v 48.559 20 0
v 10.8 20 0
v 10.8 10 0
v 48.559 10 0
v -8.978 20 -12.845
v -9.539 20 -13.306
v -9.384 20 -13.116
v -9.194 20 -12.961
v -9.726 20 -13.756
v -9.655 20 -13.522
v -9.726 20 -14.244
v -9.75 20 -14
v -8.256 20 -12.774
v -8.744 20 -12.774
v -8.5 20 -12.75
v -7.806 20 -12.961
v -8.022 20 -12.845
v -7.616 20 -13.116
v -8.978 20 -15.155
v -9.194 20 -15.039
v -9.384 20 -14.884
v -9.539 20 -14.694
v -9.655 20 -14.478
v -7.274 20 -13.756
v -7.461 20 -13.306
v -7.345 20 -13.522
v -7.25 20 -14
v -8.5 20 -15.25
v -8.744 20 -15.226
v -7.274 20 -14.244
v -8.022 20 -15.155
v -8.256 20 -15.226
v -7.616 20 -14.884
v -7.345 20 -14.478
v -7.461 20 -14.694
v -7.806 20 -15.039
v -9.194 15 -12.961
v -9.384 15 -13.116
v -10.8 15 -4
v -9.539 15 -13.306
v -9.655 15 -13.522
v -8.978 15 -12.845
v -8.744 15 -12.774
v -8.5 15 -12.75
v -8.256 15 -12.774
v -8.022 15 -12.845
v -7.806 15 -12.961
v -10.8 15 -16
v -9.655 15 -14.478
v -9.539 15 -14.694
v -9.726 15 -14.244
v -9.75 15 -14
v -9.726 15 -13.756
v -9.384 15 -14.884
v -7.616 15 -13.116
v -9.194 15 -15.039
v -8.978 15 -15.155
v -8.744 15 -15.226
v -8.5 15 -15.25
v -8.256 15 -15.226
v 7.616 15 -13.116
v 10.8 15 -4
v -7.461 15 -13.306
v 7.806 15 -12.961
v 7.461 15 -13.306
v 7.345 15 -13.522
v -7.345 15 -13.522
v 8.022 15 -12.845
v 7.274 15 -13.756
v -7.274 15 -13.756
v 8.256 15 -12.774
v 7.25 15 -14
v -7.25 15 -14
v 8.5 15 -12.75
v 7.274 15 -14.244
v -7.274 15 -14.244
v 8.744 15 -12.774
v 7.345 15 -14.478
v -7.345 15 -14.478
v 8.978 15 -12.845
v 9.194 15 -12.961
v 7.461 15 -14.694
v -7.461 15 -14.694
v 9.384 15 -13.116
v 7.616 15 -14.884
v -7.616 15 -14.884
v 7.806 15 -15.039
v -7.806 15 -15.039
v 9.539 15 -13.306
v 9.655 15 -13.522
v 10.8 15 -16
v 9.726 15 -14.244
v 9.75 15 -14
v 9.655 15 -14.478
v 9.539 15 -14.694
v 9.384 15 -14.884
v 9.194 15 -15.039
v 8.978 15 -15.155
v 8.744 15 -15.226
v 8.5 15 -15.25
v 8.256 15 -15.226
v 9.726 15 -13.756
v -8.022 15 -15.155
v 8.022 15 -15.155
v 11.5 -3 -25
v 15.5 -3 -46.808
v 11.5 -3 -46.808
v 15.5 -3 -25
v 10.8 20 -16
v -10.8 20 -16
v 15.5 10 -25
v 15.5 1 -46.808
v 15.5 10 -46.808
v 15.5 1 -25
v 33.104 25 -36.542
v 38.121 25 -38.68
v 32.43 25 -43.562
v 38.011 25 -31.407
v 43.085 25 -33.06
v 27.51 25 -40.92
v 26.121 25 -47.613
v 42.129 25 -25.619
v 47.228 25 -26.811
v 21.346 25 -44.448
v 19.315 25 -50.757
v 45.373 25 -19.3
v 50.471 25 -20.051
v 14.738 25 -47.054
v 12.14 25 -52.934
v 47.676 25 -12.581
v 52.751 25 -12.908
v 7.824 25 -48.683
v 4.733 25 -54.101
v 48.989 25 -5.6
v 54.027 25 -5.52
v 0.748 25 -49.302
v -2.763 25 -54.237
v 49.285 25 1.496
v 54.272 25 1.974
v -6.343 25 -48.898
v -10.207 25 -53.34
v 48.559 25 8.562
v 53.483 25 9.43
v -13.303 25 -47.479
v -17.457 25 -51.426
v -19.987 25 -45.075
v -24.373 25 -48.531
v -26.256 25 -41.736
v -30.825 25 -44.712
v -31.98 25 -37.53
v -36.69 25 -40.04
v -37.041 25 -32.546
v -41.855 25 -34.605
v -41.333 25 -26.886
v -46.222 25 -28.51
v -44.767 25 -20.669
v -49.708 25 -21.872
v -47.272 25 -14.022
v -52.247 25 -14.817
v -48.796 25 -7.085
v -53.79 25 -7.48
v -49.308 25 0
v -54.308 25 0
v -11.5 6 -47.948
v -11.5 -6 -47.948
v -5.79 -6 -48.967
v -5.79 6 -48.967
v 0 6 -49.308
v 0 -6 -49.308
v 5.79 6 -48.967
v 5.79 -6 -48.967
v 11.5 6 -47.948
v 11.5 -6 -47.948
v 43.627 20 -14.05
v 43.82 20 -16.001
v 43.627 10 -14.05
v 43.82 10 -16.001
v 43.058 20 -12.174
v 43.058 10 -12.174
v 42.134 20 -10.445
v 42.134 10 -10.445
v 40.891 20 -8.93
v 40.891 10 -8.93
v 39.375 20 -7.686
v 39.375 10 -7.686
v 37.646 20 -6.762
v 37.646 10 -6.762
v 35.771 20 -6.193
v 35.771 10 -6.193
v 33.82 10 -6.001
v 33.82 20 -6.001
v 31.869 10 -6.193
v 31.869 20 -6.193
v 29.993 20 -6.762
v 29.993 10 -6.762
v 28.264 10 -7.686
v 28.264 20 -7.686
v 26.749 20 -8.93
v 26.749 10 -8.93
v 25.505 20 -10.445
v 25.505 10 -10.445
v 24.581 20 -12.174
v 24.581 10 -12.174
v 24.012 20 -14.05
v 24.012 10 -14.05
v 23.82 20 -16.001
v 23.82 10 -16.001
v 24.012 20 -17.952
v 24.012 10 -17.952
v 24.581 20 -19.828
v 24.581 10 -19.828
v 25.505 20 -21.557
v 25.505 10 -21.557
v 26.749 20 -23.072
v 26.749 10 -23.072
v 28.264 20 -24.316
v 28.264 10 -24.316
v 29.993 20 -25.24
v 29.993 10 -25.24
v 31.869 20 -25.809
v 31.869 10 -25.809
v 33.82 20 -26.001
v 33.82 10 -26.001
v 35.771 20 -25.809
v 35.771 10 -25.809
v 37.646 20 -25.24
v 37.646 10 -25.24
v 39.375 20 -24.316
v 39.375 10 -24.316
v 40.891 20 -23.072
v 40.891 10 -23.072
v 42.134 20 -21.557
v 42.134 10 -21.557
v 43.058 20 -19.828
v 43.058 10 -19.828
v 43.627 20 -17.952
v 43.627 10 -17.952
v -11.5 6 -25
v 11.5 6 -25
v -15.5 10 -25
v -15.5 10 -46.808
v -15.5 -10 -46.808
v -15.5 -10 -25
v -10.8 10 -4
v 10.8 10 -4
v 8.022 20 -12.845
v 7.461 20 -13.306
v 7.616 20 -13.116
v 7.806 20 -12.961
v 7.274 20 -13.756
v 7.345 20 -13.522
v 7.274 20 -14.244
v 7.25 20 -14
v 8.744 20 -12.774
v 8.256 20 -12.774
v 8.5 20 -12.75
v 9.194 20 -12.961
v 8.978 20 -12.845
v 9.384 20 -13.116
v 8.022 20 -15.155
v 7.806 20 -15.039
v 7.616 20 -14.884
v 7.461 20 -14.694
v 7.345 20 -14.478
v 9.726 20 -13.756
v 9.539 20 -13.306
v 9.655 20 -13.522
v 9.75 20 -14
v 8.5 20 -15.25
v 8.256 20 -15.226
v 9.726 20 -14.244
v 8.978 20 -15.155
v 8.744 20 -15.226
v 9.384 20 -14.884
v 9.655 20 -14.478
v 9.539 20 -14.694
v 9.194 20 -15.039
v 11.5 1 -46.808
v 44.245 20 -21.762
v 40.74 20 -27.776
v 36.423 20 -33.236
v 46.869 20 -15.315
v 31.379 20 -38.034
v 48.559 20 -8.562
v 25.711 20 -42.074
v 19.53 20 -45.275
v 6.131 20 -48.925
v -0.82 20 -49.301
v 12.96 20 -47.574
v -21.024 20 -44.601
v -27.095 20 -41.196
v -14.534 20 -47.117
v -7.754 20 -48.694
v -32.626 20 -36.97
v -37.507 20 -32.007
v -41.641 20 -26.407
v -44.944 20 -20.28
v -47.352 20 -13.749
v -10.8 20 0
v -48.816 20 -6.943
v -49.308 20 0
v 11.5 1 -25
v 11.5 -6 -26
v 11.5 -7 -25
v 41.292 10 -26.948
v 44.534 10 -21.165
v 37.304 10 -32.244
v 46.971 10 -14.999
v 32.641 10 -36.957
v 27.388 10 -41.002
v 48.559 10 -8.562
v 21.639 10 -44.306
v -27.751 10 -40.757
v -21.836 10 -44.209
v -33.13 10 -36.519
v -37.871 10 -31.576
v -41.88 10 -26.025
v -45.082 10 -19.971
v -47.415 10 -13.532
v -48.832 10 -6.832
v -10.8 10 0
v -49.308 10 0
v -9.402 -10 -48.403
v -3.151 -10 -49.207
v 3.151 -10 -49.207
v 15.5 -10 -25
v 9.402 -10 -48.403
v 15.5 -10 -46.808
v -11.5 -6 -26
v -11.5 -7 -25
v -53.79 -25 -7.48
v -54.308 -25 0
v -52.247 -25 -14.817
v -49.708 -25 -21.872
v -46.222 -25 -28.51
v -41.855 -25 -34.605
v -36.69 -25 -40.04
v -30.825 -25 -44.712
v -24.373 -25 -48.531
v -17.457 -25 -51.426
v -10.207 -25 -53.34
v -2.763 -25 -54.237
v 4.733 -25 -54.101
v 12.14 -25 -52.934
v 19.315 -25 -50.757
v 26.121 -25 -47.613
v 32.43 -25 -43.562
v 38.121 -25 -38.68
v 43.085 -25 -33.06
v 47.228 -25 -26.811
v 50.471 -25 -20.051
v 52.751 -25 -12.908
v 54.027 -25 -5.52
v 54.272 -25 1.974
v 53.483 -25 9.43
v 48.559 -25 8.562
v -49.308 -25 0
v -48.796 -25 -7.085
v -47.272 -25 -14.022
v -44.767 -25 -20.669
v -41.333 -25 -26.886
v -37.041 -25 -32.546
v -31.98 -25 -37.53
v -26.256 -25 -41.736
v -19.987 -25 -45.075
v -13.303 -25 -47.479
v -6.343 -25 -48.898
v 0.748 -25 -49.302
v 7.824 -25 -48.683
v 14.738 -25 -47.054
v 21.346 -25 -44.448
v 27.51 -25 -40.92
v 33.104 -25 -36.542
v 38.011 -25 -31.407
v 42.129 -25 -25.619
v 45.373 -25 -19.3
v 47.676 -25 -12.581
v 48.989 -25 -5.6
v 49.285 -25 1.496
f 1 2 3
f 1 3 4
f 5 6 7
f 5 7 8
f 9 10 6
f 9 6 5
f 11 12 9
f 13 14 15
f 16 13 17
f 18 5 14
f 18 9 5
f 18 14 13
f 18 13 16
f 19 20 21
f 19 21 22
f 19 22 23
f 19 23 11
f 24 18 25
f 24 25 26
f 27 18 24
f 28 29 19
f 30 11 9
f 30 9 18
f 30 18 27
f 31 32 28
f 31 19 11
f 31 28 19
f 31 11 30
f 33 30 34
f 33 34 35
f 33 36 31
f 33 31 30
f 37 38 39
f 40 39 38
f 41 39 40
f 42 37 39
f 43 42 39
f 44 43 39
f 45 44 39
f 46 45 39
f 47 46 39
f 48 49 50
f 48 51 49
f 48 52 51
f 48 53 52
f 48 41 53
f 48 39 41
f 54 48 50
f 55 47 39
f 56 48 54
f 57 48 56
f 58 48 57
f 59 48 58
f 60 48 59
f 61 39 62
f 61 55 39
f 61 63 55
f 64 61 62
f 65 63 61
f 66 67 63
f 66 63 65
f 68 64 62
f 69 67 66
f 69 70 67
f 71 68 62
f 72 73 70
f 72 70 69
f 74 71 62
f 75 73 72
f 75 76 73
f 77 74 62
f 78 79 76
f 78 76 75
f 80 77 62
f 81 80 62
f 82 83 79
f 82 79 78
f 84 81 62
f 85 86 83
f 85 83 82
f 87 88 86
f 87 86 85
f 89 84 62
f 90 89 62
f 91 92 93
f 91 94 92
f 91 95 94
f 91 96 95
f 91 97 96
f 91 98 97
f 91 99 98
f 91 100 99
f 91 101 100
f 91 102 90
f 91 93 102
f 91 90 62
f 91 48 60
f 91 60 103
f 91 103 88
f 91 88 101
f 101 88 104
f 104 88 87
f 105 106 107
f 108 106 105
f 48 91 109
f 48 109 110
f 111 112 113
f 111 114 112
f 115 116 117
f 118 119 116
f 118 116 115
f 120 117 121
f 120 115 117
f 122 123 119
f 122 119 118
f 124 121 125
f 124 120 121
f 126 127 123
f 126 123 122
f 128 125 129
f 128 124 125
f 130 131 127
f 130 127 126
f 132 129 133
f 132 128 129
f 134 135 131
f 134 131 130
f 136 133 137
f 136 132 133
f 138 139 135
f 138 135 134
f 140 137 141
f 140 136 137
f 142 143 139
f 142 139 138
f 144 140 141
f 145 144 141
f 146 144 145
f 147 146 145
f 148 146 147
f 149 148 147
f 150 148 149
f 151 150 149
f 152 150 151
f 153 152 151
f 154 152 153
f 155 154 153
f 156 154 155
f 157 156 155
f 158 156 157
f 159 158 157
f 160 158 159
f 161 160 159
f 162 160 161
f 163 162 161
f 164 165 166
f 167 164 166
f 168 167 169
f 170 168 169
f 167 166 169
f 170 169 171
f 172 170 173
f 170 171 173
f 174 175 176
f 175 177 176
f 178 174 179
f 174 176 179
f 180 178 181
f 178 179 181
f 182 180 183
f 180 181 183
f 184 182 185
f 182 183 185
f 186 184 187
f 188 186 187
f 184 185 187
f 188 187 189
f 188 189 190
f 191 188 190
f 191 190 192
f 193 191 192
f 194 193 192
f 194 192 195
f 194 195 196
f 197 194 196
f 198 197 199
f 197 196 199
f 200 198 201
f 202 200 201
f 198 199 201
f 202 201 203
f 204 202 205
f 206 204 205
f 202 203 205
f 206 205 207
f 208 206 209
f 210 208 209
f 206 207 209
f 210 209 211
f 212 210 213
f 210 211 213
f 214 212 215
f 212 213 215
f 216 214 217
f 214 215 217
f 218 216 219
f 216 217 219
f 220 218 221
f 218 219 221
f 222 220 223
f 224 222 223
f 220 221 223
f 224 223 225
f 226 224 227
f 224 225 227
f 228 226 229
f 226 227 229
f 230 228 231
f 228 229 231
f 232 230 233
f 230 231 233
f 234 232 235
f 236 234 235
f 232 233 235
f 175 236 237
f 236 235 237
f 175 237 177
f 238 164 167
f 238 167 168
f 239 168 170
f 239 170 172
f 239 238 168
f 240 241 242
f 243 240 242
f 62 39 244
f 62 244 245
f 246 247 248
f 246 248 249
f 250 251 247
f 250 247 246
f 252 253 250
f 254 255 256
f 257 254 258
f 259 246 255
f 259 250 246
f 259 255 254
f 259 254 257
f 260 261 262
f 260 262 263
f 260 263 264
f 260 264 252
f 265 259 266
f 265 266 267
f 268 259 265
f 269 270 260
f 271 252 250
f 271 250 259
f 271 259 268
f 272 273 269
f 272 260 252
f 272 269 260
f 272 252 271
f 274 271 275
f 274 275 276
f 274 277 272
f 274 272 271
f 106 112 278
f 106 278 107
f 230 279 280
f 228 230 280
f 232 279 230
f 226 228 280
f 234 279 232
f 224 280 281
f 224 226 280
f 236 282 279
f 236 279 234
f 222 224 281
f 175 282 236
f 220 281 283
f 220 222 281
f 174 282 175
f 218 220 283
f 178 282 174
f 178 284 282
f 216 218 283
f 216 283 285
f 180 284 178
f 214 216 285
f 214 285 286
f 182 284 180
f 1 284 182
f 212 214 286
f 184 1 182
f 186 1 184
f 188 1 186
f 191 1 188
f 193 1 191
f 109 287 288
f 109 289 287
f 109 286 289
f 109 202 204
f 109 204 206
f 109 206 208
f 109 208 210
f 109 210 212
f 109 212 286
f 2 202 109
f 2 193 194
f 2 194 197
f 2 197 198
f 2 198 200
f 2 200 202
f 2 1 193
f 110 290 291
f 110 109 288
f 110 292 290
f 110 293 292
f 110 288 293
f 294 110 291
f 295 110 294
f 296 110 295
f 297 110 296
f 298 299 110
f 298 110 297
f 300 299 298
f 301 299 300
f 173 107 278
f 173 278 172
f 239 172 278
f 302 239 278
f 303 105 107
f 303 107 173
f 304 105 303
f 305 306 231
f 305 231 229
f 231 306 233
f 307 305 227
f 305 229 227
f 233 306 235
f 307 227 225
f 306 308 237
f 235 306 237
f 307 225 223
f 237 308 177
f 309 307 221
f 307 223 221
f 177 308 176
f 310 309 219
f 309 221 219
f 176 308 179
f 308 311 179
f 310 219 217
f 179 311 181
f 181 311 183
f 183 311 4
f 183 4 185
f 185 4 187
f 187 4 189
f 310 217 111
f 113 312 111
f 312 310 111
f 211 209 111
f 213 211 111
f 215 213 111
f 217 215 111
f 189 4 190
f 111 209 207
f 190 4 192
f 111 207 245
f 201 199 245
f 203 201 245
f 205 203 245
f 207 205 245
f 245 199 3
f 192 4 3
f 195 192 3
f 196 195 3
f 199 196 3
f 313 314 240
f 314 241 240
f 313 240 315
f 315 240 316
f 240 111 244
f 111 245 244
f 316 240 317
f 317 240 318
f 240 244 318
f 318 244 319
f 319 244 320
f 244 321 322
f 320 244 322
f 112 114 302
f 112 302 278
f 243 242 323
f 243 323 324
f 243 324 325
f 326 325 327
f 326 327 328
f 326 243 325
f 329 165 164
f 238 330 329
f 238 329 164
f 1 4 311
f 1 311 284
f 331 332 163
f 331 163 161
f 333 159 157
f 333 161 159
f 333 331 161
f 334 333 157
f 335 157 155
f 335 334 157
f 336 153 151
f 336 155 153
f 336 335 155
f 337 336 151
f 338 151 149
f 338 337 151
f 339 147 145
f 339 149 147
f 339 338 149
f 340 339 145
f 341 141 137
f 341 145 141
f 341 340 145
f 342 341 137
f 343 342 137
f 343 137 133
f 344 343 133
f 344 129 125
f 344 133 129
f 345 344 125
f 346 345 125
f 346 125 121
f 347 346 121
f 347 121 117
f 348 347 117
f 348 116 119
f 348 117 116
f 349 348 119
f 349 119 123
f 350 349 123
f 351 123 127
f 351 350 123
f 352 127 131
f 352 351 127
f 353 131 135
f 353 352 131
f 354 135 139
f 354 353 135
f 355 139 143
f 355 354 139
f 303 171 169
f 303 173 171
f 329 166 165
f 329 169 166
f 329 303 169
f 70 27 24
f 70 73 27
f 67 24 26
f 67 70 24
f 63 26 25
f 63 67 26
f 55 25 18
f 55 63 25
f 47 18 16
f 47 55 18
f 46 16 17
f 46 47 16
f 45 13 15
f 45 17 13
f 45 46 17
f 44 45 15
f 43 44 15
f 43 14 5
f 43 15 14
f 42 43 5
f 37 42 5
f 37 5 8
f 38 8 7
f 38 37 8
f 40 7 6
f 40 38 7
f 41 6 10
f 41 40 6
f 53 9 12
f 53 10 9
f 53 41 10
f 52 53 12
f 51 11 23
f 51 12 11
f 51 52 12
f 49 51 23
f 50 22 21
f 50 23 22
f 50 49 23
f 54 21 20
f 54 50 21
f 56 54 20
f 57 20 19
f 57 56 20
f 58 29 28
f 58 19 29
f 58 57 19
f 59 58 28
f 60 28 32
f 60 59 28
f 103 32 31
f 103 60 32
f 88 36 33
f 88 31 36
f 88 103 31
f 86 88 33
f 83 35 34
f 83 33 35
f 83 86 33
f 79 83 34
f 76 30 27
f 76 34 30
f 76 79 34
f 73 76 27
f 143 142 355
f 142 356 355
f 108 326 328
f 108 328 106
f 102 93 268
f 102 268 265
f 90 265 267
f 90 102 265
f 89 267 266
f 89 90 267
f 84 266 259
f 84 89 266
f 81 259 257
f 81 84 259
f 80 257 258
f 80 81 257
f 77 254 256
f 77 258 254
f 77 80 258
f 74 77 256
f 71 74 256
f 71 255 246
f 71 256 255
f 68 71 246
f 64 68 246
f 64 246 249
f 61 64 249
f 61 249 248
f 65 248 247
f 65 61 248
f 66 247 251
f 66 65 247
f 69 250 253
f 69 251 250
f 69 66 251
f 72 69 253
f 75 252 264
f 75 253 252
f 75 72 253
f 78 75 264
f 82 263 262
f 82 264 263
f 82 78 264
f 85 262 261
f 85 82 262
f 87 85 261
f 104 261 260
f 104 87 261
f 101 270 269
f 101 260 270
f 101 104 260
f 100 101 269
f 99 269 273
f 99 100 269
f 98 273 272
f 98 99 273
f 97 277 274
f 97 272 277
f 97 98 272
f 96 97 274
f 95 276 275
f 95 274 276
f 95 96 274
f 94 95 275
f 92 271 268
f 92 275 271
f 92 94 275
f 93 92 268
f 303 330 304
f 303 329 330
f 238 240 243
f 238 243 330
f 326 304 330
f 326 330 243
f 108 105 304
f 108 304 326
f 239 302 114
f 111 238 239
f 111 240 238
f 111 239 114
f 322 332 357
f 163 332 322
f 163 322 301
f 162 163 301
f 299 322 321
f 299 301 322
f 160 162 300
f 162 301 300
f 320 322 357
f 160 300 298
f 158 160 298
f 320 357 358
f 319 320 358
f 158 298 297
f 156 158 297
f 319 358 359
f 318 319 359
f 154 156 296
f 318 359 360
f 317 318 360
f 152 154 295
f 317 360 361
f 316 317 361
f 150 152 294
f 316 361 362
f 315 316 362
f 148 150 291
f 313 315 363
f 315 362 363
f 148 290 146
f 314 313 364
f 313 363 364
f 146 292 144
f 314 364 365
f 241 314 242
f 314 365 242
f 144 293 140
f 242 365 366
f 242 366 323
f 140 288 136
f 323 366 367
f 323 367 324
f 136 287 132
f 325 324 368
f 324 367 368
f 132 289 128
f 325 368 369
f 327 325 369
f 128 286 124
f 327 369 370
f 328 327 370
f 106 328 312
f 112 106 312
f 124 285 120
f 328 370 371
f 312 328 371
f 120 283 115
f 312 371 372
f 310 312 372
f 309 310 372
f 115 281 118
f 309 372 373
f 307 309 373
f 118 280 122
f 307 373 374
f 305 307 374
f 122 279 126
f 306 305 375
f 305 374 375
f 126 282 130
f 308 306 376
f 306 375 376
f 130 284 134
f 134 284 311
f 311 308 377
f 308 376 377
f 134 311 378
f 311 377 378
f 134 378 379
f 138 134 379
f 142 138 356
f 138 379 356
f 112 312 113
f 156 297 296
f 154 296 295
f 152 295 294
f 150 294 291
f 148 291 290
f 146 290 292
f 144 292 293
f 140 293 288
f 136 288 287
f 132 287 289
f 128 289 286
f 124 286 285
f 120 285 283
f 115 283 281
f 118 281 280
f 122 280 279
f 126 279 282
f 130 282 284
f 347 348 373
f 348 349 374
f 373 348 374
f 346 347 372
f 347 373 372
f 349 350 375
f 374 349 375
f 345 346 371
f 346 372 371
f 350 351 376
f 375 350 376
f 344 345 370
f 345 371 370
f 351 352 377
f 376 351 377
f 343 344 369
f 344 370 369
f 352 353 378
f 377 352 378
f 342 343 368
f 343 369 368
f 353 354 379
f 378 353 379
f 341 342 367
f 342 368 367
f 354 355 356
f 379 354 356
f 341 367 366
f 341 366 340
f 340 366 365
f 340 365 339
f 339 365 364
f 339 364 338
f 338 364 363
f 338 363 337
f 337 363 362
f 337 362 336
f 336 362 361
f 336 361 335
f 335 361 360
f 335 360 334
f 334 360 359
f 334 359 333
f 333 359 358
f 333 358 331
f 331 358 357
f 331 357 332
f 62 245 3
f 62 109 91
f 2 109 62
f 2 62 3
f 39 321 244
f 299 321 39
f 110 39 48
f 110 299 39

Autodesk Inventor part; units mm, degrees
ref_plane "YZ Plane" through (0, 0, 0) normal (1, 0, 0) x (0, 1, 0)
ref_plane "XZ Plane" through (0, 0, 0) normal (0, 1, 0) x (-1, 0, 0)
ref_plane "XY Plane" through (0, 0, 0) normal (0, 0, 1) x (1, 0, 0)
sketch "Sketch1" plane through (0, 0, 0) normal (0, 1, 0) x (-1, 0, 0)
  arc A0 (-48.5586, 8.5622) -> (49.3077, 0) centre (0, 0) ccw construction
  line L0 (-25, -42.5) -> (25, -42.5) construction
  line L1 (25, -42.5) -> (25, 42.5) construction
  line L2 (25, 42.5) -> (-25, 42.5) construction
  line L3 (-25, -42.5) -> (25, 42.5) construction
  line L4 (25, -42.5) -> (-25, 42.5) construction
  arc A1 (-48.5586, 8.5622) -> (49.3077, 0) centre (0, 0) ccw
  arc A2 (-53.4827, 9.4304) -> (54.3077, 0) centre (0, 0) ccw
  line L5 (-48.5586, 8.5622) -> (-53.4827, 9.4304)
  line L6 (54.3077, 0) -> (49.3077, 0)
  dimension "d0" = 85
  dimension "d1" = 50
  dimension "d2" = 5
  dimension "d4" = 54.3077
  dimension "d5" = 59.535
  dimension "d6" = 170
  dimension "d7" = 42.5
  dimension "d8" = 0
extrude "Extrusion1" add sketch "Sketch1" along normal blind 25 and the other way blind 25
sketch "Sketch2" plane through (0, 0, 0) normal (1, 0, 0) x (0, 1, 0)
  point P0 (0, 0)
sketch "Sketch3" plane through (0, 0, 0) normal (0, 0, 1) x (1, 0, 0)
  line L0 (11.5, -6) -> (-11.5, -6)
  line L1 (-11.5, -6) -> (-11.5, 6)
  line L2 (-11.5, 6) -> (11.5, 6)
  line L3 (11.5, 6) -> (11.5, -6)
  line L4 (11.5, -6) -> (-11.5, 6) construction
  line L5 (-11.5, -6) -> (11.5, 6) construction
  line L6 (15.5, 10) -> (-15.5, 10)
  line L7 (-15.5, 10) -> (-15.5, -10)
  line L8 (-15.5, -10) -> (15.5, -10)
  line L9 (15.5, -10) -> (15.5, 10)
  point P0 (0, 0)
  dimension "d11" = 23
  dimension "d12" = 12
  dimension "d13" = 4
extrude "Extrusion2" add sketch "Sketch3" against normal up to next
sketch "Sketch4" plane through (0, 0, 0) normal (0, 0, 1) x (1, 0, 0)
  line L0 (15.5, 10) -> (-15.5, 10) projected
  line L1 (-15.5, -10) -> (15.5, -10)
  line L2 (15.5, -10) -> (15.5, 10)
  line L3 (15.5, 10) -> (-15.5, 10)
  line L4 (-15.5, 10) -> (-15.5, -10)
  line L5 (-15.5, -10) -> (15.5, 10) construction
  line L6 (15.5, -10) -> (-15.5, 10) construction
  point P0 (0, 0)
  point P1 (-15.5, 10)
extrude "Extrusion3" cut sketch "Sketch4" against normal blind 25
sketch "Sketch5" plane through (0, 0, 0) normal (0, 1, 0) x (-1, 0, 0)
  point P0 (0, 0)
sketch "Sketch6" plane through (0, 0, 0) normal (0, 0, 1) x (1, 0, 0)
  line L0 (-49.3077, -25) -> (-49.3077, 25) projected
  line L1 (-49.3077, 7.7599) -> (-49.3077, -14.5309)
  line L2 (53.4827, -25) -> (53.4827, 25) projected
  line L3 (53.4827, -14.5309) -> (-53.8854, -14.5309)
  line L4 (-49.3077, 2.4805) -> (53.4827, 2.4805)
  line L5 (53.4827, 2.4805) -> (53.4827, -14.5309)
  line L6 (-49.3077, -14.5309) -> (-49.3077, 2.4805)
  line L7 (48.7697, -14.5309) -> (48.5586, 2.4805)
  line L8 (48.5586, -25) -> (48.5586, 25) projected
  point P0 (0, 0)
  dimension "d24" = 17.0114
  dimension "d25" = 22.5195
  dimension "d26" = 5.2794
  dimension "d27" = 17.0114
chamfer "Chamfer1" distance 1 angle 45 1 edges at (0, -6, -25)
sketch "Sketch7" plane through (0, 0, 0) normal (0, 0, 1) x (1, 0, 0)
  line L0 (-15.5, 10) -> (48.5586, 10)
  line L1 (48.5586, 10) -> (48.5586, 20)
  line L2 (48.5586, -25) -> (48.5586, 25) projected
  line L3 (48.5586, 20) -> (-49.3077, 20)
  line L4 (-49.3077, 20) -> (-49.3077, 10)
  line L5 (-49.3077, -25) -> (-49.3077, 25) projected
  line L6 (-15.5, 10) -> (-49.3077, 10)
  point P0 (0, 0)
  dimension "d33" = 10
extrude "Extrusion4" add sketch "Sketch7" against normal up to next
sketch "Sketch8" plane through (15.5, -10, -25) normal (1, 0, 0) x (0, 0, -1)
  line L0 (0, 20) -> (0, 0) projected
  line L1 (21.8081, 20) -> (21.8081, 0) projected
  line L2 (0, 11) -> (21.8081, 11)
  line L3 (21.8081, 11) -> (21.8081, 7)
  line L4 (21.8081, 7) -> (0, 7)
  line L5 (0, 7) -> (0, 11)
  point P0 (-25, 10)
  point P1 (0, 16)
  point P2 (0, 3)
  point P3 (0, 7)
  point P4 (21.8081, 11)
  dimension "d36" = 4
  dimension "d39" = 4
extrude "Extrusion5" cut sketch "Sketch8" against normal up to surface (4 mm away)
sketch "Sketch9" plane through (-49.3077, 10, 0) normal (0, -1, 0) x (1, 0, 0)
  circle A0 centre (83.1273, -16.0011) radius 10
  point P0 (49.3077, 0)
  dimension "d42" = 20
  dimension "d43" = 37.4138
extrude "Extrusion6" cut sketch "Sketch9" against normal up to next
sketch "Sketch10" plane through (0, 0, 0) normal (0, 1, 0) x (-1, 0, 0)
  point P0 (0, 0)
ref_plane "Work Plane1" through (-49.3077, 15, 0) normal (0, 1, 0) x (1, 0, 0)
sketch "Sketch11" plane through (-49.3077, 15, 0) normal (0, 1, 0) x (1, 0, 0)
  line L0 (60.1077, 0) -> (60.1077, 16)
  line L1 (60.1077, 16) -> (38.5077, 16)
  line L2 (38.5077, 16) -> (38.5077, 0)
  line L3 (38.5077, -16) -> (60.1077, 16) construction
  line L4 (60.1077, -16) -> (38.5077, 16) construction
  line L5 (97.8663, 0) -> (0, 0) projected
  line L6 (38.5077, 0) -> (60.1077, 0)
  point P0 (49.3077, 0)
  dimension "d47" = 32
  dimension "d48" = 21.6
  dimension "d49" = 124.019
  dimension "d50" = 55.981
  dimension "d51" = 16
extrude "Extrusion7" cut sketch "Sketch11" along normal up to next
sketch "Sketch12" plane through (-49.3077, 15, 0) normal (0, 1, 0) x (1, 0, 0)
  line L0 (60.1077, 0) -> (38.5077, 0) projected
  line L1 (38.5077, 0) -> (38.5077, 16) projected
  line L2 (60.1077, 0) -> (38.5077, 0)
  line L3 (38.5077, 0) -> (38.5077, 4)
  line L4 (38.5077, 4) -> (60.1077, 4)
  line L5 (60.1077, 4) -> (60.1077, 0)
  point P0 (49.3077, 0)
  dimension "d54" = 4
extrude "Extrusion8" cut sketch "Sketch12" against normal up to next
sketch "Sketch13" plane through (-49.3077, 15, 0) normal (0, 1, 0) x (1, 0, 0)
  line L0 (38.5077, 4) -> (60.1077, 4) projected
  line L1 (60.1077, 16) -> (38.5077, 16) projected
  line L2 (60.1077, 4) -> (38.5077, 4)
  line L3 (38.5077, 4) -> (38.5077, 16)
  line L4 (38.5077, 16) -> (60.1077, 16)
  line L5 (60.1077, 16) -> (60.1077, 4)
  circle A0 centre (40.8077, 14) radius 1.25
  line L6 (49.3077, 16) -> (49.3077, 4) construction
  circle A1 centre (57.8077, 14) radius 1.25
  point P0 (49.3077, 0)
  dimension "d57" = 2.5
  dimension "d58" = 2.3
  dimension "d59" = 2
extrude "Extrusion9" add sketch "Sketch13" along normal blind 5 contours A0 | A1
properties part number "airframe"
